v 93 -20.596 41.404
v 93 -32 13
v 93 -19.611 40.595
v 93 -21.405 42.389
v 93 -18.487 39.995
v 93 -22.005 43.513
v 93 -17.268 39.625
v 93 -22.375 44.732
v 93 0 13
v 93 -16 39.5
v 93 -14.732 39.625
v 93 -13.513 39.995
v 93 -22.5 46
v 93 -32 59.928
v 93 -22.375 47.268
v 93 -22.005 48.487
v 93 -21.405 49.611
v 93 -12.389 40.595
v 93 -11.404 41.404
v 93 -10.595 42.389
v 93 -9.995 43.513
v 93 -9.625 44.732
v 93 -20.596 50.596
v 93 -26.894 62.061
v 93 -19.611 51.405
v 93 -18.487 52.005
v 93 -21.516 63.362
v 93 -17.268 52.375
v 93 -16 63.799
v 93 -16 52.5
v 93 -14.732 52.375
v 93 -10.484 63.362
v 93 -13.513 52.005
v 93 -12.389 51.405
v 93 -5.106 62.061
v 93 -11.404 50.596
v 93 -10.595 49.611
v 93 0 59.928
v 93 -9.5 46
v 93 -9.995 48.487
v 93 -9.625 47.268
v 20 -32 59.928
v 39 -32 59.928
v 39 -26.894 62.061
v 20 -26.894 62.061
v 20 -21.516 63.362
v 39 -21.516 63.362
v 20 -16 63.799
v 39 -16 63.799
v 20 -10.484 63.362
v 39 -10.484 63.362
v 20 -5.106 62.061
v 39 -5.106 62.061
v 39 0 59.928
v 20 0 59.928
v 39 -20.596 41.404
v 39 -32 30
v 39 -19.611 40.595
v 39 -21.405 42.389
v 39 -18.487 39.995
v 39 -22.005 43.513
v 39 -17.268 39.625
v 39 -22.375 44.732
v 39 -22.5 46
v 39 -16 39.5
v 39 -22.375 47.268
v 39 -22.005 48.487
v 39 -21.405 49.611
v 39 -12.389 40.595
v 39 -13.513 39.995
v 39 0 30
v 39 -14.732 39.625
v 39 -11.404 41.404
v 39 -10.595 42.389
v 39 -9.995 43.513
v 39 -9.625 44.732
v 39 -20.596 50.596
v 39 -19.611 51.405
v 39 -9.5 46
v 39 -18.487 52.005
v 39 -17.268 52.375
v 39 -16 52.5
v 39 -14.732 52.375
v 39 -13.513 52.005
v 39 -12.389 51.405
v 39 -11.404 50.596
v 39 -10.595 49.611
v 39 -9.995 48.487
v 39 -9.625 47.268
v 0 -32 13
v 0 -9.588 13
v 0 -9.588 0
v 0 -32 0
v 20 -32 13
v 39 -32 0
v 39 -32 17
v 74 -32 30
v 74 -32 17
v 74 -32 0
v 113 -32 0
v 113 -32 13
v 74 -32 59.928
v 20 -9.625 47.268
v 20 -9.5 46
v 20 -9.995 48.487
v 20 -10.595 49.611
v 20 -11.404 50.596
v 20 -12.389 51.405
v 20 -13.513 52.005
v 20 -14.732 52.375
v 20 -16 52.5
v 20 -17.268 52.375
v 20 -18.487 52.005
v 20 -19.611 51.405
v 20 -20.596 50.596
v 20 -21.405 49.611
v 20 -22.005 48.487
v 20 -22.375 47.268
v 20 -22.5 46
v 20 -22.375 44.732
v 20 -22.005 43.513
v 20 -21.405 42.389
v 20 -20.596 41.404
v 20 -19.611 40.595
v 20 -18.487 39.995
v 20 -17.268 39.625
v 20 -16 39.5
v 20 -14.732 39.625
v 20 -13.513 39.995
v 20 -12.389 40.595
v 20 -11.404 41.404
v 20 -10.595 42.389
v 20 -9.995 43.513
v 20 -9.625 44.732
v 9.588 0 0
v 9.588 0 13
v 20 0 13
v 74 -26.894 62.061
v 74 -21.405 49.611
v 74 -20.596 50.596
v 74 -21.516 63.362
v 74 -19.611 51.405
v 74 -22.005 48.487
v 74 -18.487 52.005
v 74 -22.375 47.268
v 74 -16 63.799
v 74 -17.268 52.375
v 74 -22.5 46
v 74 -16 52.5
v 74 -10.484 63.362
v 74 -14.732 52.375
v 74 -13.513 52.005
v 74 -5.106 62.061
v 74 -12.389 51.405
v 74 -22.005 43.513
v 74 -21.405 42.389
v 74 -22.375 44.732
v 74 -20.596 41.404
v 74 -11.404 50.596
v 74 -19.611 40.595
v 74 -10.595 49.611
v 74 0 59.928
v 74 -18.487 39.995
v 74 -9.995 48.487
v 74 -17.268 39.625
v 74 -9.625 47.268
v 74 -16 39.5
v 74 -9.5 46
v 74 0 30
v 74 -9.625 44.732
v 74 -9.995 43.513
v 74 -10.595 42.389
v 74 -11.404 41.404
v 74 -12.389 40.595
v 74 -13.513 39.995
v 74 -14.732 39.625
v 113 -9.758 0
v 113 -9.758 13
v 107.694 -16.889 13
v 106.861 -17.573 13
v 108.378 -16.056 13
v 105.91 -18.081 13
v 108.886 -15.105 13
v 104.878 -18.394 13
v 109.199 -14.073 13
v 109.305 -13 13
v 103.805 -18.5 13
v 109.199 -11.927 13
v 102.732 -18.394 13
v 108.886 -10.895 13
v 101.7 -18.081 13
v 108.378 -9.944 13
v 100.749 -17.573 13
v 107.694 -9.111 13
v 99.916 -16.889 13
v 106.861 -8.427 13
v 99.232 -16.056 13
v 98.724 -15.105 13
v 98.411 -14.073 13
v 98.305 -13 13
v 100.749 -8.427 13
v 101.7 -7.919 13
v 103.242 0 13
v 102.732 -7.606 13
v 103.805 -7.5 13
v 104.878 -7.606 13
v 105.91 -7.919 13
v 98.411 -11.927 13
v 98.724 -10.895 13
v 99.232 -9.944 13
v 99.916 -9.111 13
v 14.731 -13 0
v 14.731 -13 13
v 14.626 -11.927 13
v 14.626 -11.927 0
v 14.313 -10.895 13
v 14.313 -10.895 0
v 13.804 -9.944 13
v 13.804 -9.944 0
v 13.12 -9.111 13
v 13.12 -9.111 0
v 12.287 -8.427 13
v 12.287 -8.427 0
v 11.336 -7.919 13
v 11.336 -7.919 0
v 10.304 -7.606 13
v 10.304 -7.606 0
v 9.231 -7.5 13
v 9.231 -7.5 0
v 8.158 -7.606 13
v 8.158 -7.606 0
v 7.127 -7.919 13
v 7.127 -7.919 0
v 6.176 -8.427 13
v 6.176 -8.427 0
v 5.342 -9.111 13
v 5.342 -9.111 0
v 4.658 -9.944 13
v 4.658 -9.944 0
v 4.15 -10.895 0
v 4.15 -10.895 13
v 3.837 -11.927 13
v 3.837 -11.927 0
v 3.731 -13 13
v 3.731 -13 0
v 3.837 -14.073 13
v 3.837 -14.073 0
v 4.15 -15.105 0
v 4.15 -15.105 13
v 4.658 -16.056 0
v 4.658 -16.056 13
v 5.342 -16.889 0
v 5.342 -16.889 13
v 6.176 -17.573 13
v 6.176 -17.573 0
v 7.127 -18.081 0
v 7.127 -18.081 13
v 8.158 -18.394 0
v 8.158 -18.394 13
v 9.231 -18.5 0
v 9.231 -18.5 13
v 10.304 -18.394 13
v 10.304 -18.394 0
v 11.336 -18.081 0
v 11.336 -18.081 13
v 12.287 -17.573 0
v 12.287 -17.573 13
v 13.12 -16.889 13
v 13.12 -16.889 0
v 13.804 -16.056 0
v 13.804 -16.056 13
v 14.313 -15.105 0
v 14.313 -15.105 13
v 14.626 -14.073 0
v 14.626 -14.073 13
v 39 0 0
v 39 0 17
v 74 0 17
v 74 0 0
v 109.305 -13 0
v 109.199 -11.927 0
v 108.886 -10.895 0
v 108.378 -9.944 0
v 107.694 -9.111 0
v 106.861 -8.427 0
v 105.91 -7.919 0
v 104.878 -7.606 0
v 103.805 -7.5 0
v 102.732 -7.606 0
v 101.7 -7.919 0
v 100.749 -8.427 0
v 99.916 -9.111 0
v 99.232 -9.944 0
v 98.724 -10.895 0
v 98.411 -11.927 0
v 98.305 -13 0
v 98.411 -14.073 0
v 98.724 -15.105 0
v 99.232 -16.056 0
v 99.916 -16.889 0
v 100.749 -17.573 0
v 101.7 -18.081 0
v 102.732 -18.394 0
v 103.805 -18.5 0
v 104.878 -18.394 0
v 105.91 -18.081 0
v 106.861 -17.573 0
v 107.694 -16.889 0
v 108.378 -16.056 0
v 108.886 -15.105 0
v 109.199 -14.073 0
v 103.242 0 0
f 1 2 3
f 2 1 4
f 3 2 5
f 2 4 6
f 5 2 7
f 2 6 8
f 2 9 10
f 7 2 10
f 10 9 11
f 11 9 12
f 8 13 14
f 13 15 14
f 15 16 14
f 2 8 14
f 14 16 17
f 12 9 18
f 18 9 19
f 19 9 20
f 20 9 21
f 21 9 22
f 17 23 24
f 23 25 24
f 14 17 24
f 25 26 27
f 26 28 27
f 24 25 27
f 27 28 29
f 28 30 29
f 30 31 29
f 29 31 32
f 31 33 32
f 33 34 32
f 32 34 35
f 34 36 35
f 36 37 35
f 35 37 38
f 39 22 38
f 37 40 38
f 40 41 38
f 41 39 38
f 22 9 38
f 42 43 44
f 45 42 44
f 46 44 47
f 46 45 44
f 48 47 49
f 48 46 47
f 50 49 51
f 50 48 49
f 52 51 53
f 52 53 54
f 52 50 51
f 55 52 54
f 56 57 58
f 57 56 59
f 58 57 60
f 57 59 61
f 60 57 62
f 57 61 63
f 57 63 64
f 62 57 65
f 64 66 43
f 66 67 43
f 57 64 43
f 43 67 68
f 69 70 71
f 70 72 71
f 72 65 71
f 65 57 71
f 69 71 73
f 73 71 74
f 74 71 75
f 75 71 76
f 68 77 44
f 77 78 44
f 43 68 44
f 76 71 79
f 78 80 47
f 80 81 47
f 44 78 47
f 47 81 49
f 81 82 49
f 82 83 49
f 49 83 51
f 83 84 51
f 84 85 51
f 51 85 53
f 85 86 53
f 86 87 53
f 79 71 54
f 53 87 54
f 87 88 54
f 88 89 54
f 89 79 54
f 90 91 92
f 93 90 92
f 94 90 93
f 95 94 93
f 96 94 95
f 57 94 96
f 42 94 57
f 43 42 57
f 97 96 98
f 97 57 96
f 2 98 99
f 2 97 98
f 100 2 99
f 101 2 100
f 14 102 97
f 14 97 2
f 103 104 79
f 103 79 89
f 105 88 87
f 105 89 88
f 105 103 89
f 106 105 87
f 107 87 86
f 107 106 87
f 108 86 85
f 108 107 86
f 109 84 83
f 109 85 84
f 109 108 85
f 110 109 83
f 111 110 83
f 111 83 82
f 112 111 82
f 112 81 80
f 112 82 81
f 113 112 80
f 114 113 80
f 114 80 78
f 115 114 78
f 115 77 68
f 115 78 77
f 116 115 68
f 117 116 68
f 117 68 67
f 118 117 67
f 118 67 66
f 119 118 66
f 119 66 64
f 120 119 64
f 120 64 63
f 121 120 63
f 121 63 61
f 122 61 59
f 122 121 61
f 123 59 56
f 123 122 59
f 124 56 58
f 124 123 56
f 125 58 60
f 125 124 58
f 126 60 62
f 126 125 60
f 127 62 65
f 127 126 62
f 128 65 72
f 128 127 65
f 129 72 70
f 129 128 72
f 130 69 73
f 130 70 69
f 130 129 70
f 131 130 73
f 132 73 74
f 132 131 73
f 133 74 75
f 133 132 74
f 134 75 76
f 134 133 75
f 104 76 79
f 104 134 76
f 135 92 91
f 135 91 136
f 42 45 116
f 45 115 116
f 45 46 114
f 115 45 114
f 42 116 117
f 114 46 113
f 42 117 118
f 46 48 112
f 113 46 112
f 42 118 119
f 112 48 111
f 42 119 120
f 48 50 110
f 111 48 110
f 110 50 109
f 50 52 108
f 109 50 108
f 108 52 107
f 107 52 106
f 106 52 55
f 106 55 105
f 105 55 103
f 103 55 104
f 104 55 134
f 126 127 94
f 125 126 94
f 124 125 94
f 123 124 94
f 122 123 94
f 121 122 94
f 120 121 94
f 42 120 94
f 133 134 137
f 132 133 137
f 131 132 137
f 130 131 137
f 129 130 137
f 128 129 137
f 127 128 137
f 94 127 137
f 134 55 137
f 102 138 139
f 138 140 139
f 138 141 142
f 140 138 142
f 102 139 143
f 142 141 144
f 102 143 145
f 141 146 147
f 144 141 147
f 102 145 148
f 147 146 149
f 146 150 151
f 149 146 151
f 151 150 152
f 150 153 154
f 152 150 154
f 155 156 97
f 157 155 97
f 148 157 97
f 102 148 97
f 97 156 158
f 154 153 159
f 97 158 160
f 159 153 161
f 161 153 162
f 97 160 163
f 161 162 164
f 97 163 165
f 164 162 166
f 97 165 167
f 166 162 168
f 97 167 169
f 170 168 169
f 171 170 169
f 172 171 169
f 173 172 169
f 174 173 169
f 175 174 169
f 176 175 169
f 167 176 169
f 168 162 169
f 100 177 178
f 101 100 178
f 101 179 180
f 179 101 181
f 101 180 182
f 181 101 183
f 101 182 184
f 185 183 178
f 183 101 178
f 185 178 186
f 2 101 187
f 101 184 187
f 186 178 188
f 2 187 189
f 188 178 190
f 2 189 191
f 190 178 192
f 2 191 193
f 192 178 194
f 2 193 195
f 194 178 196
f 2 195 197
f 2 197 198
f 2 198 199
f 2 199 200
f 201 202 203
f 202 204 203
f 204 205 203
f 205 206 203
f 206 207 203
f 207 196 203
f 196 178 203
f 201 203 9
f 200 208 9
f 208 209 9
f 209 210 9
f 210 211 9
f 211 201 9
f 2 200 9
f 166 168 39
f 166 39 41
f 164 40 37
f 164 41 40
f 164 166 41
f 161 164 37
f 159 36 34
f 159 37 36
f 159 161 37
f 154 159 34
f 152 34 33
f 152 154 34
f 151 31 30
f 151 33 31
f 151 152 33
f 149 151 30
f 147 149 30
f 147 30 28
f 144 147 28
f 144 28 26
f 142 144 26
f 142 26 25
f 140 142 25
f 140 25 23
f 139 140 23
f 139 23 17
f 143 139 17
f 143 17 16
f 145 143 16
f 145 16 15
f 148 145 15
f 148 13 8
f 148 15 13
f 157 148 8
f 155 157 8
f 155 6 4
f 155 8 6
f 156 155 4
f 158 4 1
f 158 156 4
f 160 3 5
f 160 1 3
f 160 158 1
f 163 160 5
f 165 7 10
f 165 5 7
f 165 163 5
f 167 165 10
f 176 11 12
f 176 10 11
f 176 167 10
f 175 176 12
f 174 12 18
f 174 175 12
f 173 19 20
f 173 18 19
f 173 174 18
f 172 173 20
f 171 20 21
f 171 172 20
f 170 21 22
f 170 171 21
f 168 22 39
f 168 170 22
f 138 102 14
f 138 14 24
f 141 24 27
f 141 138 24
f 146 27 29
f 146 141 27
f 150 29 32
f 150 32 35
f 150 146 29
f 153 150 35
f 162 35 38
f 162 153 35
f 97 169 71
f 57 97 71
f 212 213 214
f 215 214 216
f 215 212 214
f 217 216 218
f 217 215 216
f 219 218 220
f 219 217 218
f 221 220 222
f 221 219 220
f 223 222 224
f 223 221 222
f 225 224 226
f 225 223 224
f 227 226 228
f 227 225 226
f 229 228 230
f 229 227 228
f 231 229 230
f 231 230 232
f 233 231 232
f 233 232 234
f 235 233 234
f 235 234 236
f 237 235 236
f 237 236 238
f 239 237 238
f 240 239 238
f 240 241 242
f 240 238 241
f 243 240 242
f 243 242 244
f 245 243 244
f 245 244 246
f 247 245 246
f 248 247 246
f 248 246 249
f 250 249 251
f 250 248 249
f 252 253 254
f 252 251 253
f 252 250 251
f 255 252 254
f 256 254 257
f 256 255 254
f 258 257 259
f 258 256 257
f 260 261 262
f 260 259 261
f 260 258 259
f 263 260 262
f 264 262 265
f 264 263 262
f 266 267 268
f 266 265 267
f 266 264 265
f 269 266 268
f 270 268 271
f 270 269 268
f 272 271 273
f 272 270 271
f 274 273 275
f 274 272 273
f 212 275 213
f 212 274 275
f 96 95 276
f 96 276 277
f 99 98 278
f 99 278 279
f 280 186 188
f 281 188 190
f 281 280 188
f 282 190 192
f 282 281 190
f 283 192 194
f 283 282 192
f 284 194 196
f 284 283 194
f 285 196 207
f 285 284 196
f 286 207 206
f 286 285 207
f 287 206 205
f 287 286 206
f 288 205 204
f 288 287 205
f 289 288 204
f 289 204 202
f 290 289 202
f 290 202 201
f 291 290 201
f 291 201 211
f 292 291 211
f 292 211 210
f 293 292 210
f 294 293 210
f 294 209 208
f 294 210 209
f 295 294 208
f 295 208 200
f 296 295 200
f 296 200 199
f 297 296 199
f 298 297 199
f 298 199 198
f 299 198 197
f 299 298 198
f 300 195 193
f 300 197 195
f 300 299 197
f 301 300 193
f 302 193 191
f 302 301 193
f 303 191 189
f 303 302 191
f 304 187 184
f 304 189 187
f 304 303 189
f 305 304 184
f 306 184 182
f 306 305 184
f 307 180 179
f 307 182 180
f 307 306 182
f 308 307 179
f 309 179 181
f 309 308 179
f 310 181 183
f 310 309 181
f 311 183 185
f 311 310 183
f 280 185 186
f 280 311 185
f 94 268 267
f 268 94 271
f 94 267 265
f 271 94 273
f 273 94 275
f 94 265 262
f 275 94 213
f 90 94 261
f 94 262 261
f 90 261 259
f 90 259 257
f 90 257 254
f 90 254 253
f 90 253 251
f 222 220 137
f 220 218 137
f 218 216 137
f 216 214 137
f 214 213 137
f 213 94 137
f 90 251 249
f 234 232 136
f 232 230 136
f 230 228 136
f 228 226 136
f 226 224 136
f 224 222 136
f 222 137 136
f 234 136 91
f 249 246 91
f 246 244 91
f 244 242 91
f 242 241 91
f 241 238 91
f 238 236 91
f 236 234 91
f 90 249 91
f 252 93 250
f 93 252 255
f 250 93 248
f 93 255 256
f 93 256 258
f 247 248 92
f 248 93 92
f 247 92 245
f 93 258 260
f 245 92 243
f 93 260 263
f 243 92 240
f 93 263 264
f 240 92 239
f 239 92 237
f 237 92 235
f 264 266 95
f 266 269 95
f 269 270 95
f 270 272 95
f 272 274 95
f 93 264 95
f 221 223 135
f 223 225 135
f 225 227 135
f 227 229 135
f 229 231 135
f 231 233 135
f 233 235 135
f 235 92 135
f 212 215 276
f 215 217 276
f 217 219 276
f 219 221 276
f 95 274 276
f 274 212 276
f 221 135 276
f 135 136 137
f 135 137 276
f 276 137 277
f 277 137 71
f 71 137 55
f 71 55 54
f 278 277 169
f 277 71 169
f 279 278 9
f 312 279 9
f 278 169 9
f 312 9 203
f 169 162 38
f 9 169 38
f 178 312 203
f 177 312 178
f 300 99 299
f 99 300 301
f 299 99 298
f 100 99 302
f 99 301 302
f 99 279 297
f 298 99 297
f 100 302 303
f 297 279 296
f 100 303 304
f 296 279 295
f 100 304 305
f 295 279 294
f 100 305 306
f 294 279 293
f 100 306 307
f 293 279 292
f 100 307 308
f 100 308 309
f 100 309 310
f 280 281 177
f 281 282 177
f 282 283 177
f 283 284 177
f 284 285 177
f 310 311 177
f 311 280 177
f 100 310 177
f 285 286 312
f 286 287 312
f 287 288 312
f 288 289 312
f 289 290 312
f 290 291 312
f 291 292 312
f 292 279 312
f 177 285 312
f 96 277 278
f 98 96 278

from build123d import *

# Parameters (mm, degrees)
F1_DEPTH = 32
F2_R     = 5.5
F3_DEPTH = 25
F4_R     = 6.5
F5_DEPTH = 113.001


with BuildPart() as f1:
    # F0 (on Front) → F1 (new body)
    with BuildSketch(Plane.XZ):
        Polygon((0, 13), (0, 0), (39, 0), (39, 17), (74, 17), (74, 0), (113, 0), (113, 13), (93, 13), (93, 64), (74, 64), (74, 30), (39, 30), (39, 64), (20, 64), (20, 13), align=None)
    extrude(amount=F1_DEPTH)

    # F2 (on Top) → F3 (cut)
    with BuildSketch(Plane.XY):
        with Locations((9.231269, -13)):
            Circle(F2_R)
        with Locations((103.805094, -13)):
            Circle(F2_R)
        Polygon((9.587883, 0), (0, 0), (0, -9.587883), align=None)
        Polygon((113, -9.757595), (113, 0), (103.242405, 0), align=None)
    extrude(amount=F3_DEPTH, mode=Mode.SUBTRACT)

    # F4 (on Right) → F5 (cut, through all)
    with BuildSketch(Plane.YZ):
        with Locations((-16, 46)):
            Circle(F4_R)
        with BuildLine():
            ThreePointArc((-32, 59.928225), (-16, 63.799461), (0, 59.928225))
            Line((0, 59.928225), (0, 64))
            Line((0, 64), (-32, 64))
            Line((-32, 64), (-32, 59.928225))
        make_face()
    extrude(amount=F5_DEPTH, mode=Mode.SUBTRACT)


solid = f1.part
